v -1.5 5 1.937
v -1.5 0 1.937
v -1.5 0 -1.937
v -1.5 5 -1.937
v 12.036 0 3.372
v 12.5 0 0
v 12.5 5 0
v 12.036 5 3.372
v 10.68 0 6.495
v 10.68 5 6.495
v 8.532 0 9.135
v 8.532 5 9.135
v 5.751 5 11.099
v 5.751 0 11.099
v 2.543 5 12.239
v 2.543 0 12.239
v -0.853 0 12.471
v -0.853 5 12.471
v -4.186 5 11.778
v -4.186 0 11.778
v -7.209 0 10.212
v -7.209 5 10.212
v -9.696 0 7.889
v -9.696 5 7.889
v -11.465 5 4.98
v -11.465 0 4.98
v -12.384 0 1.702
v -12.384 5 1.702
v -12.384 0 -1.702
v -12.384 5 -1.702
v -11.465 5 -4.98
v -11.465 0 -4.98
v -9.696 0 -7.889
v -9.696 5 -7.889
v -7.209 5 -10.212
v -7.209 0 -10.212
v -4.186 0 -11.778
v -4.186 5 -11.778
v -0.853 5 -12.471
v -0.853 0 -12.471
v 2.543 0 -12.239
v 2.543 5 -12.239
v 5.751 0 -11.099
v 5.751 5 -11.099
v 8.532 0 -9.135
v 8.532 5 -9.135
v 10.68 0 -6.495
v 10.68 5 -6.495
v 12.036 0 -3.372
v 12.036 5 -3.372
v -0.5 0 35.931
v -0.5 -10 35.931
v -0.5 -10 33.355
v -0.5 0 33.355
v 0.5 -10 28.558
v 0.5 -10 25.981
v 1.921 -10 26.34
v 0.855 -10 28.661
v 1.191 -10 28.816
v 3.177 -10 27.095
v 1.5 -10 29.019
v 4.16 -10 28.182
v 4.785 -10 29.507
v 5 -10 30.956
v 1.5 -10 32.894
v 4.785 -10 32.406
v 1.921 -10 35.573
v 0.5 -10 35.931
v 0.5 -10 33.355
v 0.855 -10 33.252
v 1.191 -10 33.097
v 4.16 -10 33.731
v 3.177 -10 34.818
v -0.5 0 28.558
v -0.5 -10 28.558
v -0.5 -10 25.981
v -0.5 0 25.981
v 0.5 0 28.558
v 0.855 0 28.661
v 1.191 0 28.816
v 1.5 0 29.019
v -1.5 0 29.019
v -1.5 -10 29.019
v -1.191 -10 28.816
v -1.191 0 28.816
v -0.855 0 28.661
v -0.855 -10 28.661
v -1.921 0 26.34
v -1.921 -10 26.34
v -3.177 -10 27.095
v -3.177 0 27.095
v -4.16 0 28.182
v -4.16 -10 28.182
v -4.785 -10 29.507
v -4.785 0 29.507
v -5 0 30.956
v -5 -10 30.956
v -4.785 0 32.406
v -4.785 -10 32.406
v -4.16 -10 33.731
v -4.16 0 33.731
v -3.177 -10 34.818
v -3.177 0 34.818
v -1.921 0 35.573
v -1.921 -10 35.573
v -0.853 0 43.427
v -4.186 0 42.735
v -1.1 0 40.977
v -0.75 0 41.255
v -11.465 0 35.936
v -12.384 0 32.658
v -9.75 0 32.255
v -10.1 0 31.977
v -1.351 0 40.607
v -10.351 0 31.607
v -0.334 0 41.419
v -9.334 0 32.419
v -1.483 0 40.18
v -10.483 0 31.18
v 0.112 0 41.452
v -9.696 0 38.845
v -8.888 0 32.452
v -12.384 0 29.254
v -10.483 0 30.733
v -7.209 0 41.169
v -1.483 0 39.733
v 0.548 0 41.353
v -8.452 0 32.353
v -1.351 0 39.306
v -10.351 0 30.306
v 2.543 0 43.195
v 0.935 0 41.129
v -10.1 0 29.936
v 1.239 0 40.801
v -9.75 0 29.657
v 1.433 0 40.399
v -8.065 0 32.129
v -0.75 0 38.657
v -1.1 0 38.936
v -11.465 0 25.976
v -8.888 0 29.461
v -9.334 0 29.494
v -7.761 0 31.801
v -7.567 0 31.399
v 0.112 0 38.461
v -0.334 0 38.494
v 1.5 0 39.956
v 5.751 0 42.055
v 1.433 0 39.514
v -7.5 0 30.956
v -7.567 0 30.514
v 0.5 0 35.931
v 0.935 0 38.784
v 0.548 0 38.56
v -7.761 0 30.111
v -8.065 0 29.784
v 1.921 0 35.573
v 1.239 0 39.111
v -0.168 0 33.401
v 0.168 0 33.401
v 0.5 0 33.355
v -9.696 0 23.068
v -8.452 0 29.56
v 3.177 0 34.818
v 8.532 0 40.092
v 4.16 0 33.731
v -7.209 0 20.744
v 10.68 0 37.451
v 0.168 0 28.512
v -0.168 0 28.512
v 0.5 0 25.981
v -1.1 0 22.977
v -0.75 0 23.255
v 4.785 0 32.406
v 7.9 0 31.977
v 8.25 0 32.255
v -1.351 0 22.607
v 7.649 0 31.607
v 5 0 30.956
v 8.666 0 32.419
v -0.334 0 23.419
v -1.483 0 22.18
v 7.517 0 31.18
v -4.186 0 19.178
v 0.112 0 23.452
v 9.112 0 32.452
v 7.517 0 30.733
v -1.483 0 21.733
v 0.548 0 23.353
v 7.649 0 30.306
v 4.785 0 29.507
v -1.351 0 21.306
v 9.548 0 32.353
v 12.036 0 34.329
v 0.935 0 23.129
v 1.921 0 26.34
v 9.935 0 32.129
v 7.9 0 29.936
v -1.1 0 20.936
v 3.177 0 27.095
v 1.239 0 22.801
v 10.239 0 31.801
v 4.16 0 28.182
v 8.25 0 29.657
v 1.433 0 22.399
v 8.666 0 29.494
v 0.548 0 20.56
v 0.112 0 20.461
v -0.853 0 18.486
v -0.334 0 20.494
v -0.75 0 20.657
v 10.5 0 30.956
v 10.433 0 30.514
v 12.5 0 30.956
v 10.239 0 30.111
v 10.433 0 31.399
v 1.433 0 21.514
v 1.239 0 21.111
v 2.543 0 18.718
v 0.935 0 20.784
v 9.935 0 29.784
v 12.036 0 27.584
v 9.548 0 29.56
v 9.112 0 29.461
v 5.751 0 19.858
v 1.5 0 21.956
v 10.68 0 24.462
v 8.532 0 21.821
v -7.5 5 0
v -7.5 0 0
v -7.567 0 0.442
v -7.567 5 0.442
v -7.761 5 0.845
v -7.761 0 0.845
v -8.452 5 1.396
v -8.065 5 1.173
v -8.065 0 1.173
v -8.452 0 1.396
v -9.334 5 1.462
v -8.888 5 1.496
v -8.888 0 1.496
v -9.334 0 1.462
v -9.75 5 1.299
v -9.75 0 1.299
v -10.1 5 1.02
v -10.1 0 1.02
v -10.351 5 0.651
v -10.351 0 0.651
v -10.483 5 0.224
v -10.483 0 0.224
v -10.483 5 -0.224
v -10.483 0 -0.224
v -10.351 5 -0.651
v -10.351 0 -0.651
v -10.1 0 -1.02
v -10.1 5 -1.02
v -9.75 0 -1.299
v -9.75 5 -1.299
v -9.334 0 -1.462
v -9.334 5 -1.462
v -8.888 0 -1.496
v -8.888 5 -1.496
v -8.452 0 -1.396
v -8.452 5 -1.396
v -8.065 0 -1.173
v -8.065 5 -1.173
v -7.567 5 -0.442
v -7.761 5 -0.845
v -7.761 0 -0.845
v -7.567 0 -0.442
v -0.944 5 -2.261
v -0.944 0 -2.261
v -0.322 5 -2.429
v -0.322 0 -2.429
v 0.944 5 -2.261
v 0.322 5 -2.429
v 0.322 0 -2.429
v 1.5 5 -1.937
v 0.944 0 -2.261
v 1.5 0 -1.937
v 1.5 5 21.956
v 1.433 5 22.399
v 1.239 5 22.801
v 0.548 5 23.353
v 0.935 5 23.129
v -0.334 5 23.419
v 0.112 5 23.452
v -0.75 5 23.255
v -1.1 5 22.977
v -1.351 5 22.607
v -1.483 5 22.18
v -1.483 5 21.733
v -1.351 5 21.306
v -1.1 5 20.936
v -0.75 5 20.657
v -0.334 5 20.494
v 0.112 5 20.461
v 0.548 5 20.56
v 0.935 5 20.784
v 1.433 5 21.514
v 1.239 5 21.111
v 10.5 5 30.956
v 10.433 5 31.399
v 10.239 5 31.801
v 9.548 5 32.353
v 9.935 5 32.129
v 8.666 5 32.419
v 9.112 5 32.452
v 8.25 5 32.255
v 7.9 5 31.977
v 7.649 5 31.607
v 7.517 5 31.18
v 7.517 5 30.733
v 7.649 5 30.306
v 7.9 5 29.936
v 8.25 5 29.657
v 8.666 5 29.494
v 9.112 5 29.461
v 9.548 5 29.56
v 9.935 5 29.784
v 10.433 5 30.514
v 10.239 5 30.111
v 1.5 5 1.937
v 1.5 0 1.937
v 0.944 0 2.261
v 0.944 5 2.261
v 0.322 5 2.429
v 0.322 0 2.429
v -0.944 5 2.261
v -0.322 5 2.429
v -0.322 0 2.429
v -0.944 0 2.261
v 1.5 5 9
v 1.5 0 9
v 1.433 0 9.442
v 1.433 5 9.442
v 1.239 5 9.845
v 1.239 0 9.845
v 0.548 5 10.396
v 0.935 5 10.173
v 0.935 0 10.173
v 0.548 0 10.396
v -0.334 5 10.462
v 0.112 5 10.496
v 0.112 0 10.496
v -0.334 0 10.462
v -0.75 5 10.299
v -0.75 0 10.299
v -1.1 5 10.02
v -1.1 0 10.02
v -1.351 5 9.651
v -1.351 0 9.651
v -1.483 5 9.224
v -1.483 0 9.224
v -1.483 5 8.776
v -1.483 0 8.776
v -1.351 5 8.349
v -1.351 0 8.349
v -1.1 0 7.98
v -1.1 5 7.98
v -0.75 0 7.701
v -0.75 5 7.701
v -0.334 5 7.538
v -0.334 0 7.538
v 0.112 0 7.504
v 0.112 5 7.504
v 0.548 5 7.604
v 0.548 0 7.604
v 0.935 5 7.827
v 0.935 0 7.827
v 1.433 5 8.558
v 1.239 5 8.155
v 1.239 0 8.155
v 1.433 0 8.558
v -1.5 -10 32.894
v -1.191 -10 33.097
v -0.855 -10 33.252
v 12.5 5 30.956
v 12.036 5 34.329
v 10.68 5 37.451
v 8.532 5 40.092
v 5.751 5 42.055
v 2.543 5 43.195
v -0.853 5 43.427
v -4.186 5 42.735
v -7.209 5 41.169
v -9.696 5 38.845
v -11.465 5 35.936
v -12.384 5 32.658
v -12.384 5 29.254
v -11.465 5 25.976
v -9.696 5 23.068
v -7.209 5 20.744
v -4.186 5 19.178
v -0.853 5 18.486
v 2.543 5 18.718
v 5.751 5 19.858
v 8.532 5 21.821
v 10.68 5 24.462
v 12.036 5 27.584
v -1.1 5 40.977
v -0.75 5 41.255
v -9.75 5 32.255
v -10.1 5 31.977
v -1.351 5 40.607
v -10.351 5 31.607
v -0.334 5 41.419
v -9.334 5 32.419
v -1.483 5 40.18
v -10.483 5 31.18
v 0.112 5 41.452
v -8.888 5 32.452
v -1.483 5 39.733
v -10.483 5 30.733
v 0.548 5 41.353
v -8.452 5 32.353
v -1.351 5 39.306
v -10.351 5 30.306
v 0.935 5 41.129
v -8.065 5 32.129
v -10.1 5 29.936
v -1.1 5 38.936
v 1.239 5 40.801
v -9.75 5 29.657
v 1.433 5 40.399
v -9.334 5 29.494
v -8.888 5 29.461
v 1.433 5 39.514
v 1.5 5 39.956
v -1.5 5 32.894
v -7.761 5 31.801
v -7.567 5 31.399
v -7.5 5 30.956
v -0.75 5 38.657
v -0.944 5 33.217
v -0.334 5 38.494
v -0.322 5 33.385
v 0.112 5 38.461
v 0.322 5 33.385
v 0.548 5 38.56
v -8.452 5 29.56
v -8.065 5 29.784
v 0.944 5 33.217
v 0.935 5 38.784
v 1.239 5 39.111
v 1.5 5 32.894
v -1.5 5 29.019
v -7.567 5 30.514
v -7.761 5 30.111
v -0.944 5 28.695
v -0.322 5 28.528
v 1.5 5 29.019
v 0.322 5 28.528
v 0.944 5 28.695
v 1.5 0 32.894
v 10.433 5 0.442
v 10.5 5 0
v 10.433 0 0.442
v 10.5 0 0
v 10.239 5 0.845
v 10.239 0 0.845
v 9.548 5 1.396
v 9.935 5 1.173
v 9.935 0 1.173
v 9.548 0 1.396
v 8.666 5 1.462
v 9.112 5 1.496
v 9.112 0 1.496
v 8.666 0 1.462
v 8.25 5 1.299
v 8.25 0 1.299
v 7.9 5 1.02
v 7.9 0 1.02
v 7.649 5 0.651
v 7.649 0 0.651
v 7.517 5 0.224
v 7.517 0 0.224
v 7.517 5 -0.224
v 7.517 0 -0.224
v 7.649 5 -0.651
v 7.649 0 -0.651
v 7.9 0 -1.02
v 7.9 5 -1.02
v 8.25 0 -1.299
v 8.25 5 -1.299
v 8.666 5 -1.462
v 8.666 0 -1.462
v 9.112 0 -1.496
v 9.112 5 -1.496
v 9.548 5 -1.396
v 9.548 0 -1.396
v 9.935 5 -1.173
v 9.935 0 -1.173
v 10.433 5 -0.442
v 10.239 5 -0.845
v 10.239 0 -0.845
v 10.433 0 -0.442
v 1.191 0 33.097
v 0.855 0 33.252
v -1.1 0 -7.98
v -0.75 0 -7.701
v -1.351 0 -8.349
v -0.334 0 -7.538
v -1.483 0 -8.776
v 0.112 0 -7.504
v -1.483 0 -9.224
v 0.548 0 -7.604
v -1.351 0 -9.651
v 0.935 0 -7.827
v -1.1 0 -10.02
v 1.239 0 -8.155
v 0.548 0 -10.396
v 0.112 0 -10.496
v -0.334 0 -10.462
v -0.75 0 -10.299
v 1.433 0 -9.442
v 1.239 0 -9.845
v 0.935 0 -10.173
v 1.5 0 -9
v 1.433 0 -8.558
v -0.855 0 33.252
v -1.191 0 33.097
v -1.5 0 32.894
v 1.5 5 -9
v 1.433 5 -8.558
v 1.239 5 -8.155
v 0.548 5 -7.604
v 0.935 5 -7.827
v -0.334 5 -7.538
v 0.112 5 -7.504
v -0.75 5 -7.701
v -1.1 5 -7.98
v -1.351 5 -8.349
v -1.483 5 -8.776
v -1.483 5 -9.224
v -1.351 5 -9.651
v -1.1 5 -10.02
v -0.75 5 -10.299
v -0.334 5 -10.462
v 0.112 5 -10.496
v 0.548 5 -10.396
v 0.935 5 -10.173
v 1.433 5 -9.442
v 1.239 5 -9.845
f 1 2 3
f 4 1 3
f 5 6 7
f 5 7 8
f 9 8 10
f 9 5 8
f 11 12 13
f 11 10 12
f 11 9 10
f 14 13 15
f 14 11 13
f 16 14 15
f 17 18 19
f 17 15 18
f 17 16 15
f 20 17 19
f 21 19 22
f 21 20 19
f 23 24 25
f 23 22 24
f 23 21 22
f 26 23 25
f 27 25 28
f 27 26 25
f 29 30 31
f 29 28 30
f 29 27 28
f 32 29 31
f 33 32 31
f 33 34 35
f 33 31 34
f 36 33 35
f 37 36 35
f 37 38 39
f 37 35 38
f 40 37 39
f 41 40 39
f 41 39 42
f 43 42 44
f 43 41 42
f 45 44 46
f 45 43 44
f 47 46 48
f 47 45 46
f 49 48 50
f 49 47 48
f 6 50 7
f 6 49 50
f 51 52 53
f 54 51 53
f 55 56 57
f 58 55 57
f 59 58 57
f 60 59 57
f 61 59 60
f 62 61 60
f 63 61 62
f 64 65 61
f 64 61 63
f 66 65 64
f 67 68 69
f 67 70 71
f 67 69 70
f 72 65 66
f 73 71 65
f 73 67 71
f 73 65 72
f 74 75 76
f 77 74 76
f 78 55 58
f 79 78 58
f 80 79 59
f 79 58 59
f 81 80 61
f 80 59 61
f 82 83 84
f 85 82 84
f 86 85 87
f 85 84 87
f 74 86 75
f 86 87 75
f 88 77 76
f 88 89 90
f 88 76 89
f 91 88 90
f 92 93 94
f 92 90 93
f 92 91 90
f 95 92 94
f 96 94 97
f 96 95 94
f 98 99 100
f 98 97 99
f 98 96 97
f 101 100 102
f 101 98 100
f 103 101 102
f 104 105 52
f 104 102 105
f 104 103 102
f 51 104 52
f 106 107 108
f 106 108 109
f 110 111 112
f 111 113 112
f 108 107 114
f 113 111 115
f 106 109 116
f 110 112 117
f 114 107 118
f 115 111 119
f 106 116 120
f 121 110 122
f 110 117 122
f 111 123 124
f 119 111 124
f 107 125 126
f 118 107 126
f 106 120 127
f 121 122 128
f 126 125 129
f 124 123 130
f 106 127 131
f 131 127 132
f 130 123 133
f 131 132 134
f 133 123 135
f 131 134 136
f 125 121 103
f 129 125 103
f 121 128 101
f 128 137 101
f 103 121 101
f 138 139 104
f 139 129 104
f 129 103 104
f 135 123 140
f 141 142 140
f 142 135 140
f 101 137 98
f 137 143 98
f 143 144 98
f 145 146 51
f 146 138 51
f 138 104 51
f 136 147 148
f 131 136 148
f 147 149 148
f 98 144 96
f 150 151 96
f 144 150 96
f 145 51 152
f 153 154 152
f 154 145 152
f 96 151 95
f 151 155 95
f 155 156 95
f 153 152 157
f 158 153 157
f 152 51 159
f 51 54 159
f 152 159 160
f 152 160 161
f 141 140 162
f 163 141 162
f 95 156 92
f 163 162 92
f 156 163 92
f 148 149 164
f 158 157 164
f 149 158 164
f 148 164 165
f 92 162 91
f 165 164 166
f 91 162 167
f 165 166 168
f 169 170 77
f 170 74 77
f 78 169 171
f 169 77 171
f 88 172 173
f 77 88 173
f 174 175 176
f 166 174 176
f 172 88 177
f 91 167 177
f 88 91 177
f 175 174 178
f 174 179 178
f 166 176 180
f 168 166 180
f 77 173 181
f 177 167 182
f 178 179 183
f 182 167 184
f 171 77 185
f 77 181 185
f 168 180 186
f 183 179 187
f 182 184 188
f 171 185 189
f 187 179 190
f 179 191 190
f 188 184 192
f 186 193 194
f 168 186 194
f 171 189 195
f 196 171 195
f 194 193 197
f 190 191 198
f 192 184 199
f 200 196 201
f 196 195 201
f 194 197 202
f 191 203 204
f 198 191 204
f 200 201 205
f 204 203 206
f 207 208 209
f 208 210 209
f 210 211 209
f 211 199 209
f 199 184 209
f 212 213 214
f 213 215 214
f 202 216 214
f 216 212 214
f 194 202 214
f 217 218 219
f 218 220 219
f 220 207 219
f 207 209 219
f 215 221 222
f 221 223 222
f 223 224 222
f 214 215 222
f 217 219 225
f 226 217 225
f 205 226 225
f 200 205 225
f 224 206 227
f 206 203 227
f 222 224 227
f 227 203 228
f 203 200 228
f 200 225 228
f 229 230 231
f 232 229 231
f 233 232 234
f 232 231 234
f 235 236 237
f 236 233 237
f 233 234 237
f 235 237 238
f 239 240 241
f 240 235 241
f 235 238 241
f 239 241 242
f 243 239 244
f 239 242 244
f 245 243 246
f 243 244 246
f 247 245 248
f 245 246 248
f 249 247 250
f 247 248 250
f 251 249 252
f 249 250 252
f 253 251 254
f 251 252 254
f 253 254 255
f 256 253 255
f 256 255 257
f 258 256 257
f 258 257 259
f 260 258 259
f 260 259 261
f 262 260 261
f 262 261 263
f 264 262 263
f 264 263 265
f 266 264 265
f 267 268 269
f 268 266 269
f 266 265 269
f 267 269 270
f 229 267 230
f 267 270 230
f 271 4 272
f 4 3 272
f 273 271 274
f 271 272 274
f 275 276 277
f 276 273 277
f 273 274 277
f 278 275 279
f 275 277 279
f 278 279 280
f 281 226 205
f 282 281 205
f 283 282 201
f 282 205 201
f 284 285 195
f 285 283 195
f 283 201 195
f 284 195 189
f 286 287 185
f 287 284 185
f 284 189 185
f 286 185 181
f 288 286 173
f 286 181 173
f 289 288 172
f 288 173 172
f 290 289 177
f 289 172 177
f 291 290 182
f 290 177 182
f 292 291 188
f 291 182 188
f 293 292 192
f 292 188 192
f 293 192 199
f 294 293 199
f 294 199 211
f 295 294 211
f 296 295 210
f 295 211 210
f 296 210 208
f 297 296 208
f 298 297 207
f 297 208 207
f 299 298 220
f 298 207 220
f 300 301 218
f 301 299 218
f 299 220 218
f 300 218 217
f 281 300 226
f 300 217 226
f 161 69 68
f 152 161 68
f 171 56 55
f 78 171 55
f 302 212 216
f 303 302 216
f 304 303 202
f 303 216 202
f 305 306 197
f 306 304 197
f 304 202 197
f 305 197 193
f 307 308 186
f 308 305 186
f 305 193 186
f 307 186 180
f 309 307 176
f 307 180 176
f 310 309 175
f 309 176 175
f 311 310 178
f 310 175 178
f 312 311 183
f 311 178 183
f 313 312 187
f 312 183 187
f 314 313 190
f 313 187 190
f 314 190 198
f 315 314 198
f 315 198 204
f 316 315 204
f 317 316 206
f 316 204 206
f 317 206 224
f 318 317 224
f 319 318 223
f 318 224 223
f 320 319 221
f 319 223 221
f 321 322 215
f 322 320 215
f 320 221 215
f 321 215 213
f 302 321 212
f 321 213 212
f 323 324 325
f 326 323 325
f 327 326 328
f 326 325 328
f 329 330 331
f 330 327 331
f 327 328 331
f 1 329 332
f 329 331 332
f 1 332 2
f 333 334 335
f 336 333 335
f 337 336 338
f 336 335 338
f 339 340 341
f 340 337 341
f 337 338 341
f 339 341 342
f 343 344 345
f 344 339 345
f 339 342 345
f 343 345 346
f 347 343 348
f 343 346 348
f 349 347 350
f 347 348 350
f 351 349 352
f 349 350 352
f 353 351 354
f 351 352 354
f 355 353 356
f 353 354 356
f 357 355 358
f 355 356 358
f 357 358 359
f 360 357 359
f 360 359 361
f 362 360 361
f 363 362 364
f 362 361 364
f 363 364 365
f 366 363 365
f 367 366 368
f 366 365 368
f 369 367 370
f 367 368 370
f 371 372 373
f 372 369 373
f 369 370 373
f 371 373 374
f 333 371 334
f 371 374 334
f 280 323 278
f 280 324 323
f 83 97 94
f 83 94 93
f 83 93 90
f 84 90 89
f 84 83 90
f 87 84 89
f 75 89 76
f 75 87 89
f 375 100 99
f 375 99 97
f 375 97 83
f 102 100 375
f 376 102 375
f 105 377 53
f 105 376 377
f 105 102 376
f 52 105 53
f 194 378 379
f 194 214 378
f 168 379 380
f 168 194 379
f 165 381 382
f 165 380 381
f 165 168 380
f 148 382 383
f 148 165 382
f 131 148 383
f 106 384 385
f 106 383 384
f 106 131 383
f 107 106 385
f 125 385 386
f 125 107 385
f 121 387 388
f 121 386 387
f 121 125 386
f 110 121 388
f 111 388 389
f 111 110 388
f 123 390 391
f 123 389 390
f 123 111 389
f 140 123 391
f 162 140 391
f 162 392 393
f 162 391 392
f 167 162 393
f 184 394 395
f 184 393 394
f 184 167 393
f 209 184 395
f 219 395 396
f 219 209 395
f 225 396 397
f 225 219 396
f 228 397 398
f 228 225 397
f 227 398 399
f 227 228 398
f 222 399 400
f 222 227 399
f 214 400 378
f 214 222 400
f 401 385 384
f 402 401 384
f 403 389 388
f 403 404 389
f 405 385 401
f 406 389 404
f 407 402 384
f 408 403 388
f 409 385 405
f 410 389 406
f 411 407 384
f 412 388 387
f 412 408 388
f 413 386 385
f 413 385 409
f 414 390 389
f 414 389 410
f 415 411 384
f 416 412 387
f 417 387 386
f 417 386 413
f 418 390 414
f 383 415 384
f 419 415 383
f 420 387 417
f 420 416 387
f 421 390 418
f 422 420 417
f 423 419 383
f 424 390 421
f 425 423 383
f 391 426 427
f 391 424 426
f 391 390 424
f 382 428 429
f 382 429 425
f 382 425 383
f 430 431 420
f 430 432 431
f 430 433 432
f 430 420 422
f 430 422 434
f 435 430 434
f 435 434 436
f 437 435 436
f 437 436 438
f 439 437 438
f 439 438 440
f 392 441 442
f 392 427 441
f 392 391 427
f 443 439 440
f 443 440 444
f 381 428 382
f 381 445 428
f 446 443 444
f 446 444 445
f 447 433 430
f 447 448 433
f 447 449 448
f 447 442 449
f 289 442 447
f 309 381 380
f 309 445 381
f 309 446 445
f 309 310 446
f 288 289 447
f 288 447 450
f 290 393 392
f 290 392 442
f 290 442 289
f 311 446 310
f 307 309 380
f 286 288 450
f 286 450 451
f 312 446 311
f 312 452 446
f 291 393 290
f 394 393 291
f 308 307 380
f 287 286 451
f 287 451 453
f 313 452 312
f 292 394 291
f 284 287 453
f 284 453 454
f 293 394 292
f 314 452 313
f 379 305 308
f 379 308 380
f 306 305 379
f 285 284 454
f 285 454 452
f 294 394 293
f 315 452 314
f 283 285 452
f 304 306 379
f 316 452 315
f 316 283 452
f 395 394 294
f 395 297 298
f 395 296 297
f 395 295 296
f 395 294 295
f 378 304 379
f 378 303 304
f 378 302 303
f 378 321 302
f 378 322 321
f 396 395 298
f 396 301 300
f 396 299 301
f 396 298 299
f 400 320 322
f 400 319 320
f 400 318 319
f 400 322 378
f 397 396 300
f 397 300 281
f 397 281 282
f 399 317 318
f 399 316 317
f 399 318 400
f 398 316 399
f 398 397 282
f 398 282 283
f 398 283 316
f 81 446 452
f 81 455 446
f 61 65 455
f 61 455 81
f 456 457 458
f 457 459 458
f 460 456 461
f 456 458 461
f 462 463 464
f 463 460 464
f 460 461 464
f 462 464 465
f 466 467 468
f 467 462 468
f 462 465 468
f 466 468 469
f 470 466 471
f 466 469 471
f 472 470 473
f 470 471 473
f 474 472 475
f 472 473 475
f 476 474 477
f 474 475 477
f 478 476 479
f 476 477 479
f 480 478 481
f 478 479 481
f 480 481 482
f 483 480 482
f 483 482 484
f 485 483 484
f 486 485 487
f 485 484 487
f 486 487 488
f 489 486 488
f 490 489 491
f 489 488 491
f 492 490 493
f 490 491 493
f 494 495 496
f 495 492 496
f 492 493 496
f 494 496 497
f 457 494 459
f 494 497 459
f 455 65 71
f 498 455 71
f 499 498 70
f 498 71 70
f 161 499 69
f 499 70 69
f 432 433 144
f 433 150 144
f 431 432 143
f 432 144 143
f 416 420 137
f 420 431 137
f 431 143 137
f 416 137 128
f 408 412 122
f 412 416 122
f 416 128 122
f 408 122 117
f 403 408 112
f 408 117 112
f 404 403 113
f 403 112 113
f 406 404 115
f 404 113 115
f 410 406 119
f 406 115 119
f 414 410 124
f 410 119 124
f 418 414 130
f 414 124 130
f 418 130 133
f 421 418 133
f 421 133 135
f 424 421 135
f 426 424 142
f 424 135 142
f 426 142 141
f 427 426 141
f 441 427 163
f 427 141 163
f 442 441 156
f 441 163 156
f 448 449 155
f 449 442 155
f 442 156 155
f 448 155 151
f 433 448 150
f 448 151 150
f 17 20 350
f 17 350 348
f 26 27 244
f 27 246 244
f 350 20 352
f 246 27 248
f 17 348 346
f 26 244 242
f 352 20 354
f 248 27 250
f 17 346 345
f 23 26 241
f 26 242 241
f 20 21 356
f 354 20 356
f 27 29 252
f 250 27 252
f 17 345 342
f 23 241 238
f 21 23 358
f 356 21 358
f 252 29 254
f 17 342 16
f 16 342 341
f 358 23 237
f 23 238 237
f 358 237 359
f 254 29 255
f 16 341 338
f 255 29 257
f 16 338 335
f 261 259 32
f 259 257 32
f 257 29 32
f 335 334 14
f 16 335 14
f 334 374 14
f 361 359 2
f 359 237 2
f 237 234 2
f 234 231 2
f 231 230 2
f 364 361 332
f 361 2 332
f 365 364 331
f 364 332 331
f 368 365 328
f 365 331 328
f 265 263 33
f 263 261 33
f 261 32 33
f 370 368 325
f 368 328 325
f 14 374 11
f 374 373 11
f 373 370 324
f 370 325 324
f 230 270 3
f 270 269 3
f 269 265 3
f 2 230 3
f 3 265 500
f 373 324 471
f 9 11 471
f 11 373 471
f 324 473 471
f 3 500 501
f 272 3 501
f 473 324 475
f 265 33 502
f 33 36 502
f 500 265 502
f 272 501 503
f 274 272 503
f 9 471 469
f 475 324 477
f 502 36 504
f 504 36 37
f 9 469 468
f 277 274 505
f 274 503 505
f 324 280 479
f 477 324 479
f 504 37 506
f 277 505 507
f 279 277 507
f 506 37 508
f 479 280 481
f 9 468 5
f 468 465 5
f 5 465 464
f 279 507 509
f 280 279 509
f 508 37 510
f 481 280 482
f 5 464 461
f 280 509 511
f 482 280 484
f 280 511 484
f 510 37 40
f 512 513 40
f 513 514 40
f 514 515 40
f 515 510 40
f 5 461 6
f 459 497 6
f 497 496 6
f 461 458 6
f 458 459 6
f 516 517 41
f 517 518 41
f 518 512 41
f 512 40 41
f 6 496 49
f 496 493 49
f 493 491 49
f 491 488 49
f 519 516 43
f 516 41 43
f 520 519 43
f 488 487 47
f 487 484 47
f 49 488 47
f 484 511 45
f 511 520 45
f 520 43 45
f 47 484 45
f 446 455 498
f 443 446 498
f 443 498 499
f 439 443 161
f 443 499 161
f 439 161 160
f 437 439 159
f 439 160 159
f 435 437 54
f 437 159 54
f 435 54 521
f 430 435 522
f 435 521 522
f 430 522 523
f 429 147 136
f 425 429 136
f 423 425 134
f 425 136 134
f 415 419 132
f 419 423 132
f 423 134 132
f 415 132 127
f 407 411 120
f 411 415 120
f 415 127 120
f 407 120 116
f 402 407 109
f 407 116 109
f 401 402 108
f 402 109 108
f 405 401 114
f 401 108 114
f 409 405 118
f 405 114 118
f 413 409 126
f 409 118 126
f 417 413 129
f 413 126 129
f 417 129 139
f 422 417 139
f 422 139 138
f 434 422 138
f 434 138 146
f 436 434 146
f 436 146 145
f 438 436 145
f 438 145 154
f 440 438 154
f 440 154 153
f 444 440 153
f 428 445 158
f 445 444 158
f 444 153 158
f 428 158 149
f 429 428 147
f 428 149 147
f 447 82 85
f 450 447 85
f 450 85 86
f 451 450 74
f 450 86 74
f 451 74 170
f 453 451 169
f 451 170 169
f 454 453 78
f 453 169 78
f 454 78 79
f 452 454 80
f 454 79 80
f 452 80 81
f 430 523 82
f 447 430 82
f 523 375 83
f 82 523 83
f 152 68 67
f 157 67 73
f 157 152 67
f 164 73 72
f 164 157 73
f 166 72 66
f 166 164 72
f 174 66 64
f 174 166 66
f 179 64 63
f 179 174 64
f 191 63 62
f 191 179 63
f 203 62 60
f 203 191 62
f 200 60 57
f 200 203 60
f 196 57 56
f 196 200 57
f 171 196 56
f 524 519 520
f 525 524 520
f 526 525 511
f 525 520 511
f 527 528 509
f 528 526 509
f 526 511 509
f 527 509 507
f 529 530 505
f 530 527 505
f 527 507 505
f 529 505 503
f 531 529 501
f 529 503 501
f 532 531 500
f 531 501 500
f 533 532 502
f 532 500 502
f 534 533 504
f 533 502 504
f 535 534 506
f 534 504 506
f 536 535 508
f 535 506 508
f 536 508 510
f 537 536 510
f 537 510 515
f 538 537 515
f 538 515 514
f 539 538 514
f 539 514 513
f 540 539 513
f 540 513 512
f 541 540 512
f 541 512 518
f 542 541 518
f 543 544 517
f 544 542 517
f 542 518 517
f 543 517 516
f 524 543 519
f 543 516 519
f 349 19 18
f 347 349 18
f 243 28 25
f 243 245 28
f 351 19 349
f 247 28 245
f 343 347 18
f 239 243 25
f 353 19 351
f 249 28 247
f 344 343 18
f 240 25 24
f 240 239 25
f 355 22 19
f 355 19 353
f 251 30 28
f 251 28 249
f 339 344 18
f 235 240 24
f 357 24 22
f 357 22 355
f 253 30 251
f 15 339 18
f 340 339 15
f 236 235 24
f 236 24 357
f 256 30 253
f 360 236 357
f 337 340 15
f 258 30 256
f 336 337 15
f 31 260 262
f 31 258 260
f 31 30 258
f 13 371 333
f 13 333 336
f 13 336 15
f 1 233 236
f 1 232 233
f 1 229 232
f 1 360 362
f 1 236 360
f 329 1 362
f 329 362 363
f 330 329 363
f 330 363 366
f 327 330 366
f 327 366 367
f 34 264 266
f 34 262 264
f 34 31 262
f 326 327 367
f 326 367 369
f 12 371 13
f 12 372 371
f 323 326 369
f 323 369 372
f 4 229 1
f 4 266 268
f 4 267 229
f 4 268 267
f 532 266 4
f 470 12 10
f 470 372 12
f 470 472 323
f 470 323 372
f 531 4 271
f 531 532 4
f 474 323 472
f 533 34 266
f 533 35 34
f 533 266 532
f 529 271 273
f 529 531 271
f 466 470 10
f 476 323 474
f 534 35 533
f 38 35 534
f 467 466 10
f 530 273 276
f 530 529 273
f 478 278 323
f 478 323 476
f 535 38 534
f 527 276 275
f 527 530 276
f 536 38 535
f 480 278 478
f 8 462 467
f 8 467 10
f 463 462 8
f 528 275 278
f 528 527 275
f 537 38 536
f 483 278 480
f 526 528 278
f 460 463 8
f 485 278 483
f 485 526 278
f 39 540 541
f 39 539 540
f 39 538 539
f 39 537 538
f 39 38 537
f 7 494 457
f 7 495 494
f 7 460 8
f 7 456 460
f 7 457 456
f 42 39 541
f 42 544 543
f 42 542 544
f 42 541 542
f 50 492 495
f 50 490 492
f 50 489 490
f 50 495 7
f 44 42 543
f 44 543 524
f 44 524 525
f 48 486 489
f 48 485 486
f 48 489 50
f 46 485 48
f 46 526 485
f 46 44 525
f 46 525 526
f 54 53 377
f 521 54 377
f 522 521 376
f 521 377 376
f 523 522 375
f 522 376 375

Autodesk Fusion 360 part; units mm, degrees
sketch "Sketch1" plane through (0, 0, 0) normal (0, 1, 0) x (1, 0, 0) in component "laserCutExample"
  line L0 (0, 0) -> (0, 2.45) construction
  line L1 (-1.5, -1.9371) -> (-1.5, 1.9371)
  line L2 (1.5, -1.9371) -> (1.5, 1.9371)
  arc A0 (-1.5, -1.9371) -> (1.5, -1.9371) centre (0, 0) ccw
  arc A1 (1.5, 1.9371) -> (-1.5, 1.9371) centre (0, 0) ccw
  circle A2 centre (0, 0) radius 12.5
  circle A3 centre (0, -9) radius 1.5
  circle A4 centre (9, 0) radius 1.5
  circle A5 centre (0, 9) radius 1.5
  circle A6 centre (-9, 0) radius 1.5
  dimension "d1" = 4.9
  dimension "d2" = 3
  dimension "d3" = 3
  dimension "d4" = 9
  dimension "d6" = 360
  dimension "d14" = 25
extrude "Extrude1" add sketch "Sketch1" along normal blind 5 makes body 1 in component "laserCutExample"
sketch "Sketch1 (2)" plane through (0, 0, 0) normal (0, 1, 0) x (1, 0, 0) in component "3dPrintExample"
  line L0 (0, 0) -> (0, 2.45) construction
  line L1 (-1.5, -1.9371) -> (-1.5, 1.9371)
  line L2 (1.5, -1.9371) -> (1.5, 1.9371)
  arc A0 (-1.5, -1.9371) -> (1.5, -1.9371) centre (0, 0) ccw
  arc A1 (1.5, 1.9371) -> (-1.5, 1.9371) centre (0, 0) ccw
  circle A2 centre (0, 0) radius 12.5
  circle A3 centre (0, -9) radius 1.5
  circle A4 centre (9, 0) radius 1.5
  circle A5 centre (0, 9) radius 1.5
  circle A6 centre (-9, 0) radius 1.5
  dimension "d1_1" = 4.9
  dimension "d2_1" = 3
  dimension "d3_1" = 3
  dimension "d4_1" = 9
  dimension "d6_1" = 360
  dimension "d11" = 25
extrude "Extrude1'" add sketch "Sketch1 (2)" along normal blind 5 separate body makes body 2 in component "3dPrintExample"
sketch "Sketch2" plane through (0, 0, 0) normal (0, -1, 0) x (1, 0, 0) in component "3dPrintExample"
  arc A0 (1.5, 1.9371) -> (-1.5, 1.9371) centre (0, 0) ccw
  line L0 (1.5, 1.9371) -> (1.5, -1.9371)
  arc A1 (-1.5, -1.9371) -> (1.5, -1.9371) centre (0, 0) ccw
  line L1 (-1.5, -1.9371) -> (-1.5, 1.9371)
  circle A2 centre (0, -9) radius 1.5
  circle A3 centre (-9, 0) radius 1.5
  circle A4 centre (0, 9) radius 1.5
  circle A5 centre (9, 0) radius 1.5
  circle A6 centre (0, 0) radius 12.5
  circle A7 centre (0, 0) radius 5
  line L2 (-0.5, -5) -> (0.5, -5)
  line L3 (0.5, -5) -> (0.5, 5)
  line L4 (0.5, 5) -> (-0.5, 5)
  line L5 (-0.5, 5) -> (-0.5, -5)
  line L6 (-0.5, -5) -> (0.5, 5) construction
  line L7 (0.5, -5) -> (-0.5, 5) construction
  dimension "d12" = 10
  dimension "d13" = 1
extrude "Extrude2" add sketch "Sketch2" along normal blind 10 contours A0 L0 A1 A7 L3 | A0 A1 L1 A7 L5 bodies 2 in component "3dPrintExample"
component "laserCutExample" placed x (1, 0, 0) y (0, 1, 0) z (0, 0, 1) at (0, 0, 0)
component "3dPrintExample" placed x (1, 0, 0) y (0, 1, 0) z (0, 0, 1) at (0, 0, 30.9564)
